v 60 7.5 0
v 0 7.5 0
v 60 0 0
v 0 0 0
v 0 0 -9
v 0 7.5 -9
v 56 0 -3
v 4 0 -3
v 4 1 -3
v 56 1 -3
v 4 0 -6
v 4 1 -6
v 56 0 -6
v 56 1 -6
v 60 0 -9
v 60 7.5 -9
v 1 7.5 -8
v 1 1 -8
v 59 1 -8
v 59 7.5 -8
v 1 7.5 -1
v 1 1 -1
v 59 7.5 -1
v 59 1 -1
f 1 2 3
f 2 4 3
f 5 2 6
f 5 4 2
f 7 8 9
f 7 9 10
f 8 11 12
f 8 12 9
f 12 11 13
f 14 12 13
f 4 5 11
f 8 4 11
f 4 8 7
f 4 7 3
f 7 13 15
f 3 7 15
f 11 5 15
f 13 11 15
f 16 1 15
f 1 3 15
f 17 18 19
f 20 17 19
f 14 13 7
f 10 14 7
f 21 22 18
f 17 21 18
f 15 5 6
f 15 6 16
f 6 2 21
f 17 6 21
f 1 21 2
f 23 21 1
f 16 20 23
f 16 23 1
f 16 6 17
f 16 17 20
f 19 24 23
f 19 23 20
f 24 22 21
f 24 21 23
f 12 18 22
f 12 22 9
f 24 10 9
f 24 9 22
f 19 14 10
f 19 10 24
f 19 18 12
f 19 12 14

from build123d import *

# Parameters (mm, degrees)
ESQUISSE1_W             = 60
ESQUISSE1_H             = 9
BOSS_EXTRU_1_DEPTH      = 1
ESQUISSE2_W             = 60
ESQUISSE2_H             = 9
ESQUISSE2_W_2           = 58
ESQUISSE2_H_2           = 7
BOSS_EXTRU_2_DEPTH      = 6.5
ESQUISSE3_W             = 52
ESQUISSE3_H             = 3
ENL_V_MAT_EXTRU_1_DEPTH = 8.5


with BuildPart() as part:
    # Esquisse1 → Boss.-Extru.1 (new body)
    with BuildSketch(Plane(origin=(0, 0, 0), x_dir=(1, 0, 0), z_dir=(0, 1, 0))):
        with Locations((30, 4.5)):
            Rectangle(ESQUISSE1_W, ESQUISSE1_H)
    extrude(amount=BOSS_EXTRU_1_DEPTH)

    # Esquisse2 → Boss.-Extru.2 (add)
    with BuildSketch(Plane(origin=(0, 1, 0), x_dir=(1, 0, 0), z_dir=(0, 1, 0))):
        with Locations((30, 4.5)):
            Rectangle(ESQUISSE2_W, ESQUISSE2_H)
        with Locations((30, 4.5)):
            Rectangle(ESQUISSE2_W_2, ESQUISSE2_H_2, mode=Mode.SUBTRACT)
    extrude(amount=BOSS_EXTRU_2_DEPTH)

    # Esquisse3 → Enlèv. mat.-Extru.1 (cut, through all)
    with BuildSketch(Plane.XZ):
        with Locations((30, -4.5)):
            Rectangle(ESQUISSE3_W, ESQUISSE3_H)
    extrude(amount=-ENL_V_MAT_EXTRU_1_DEPTH, mode=Mode.SUBTRACT)


solid = part.part
